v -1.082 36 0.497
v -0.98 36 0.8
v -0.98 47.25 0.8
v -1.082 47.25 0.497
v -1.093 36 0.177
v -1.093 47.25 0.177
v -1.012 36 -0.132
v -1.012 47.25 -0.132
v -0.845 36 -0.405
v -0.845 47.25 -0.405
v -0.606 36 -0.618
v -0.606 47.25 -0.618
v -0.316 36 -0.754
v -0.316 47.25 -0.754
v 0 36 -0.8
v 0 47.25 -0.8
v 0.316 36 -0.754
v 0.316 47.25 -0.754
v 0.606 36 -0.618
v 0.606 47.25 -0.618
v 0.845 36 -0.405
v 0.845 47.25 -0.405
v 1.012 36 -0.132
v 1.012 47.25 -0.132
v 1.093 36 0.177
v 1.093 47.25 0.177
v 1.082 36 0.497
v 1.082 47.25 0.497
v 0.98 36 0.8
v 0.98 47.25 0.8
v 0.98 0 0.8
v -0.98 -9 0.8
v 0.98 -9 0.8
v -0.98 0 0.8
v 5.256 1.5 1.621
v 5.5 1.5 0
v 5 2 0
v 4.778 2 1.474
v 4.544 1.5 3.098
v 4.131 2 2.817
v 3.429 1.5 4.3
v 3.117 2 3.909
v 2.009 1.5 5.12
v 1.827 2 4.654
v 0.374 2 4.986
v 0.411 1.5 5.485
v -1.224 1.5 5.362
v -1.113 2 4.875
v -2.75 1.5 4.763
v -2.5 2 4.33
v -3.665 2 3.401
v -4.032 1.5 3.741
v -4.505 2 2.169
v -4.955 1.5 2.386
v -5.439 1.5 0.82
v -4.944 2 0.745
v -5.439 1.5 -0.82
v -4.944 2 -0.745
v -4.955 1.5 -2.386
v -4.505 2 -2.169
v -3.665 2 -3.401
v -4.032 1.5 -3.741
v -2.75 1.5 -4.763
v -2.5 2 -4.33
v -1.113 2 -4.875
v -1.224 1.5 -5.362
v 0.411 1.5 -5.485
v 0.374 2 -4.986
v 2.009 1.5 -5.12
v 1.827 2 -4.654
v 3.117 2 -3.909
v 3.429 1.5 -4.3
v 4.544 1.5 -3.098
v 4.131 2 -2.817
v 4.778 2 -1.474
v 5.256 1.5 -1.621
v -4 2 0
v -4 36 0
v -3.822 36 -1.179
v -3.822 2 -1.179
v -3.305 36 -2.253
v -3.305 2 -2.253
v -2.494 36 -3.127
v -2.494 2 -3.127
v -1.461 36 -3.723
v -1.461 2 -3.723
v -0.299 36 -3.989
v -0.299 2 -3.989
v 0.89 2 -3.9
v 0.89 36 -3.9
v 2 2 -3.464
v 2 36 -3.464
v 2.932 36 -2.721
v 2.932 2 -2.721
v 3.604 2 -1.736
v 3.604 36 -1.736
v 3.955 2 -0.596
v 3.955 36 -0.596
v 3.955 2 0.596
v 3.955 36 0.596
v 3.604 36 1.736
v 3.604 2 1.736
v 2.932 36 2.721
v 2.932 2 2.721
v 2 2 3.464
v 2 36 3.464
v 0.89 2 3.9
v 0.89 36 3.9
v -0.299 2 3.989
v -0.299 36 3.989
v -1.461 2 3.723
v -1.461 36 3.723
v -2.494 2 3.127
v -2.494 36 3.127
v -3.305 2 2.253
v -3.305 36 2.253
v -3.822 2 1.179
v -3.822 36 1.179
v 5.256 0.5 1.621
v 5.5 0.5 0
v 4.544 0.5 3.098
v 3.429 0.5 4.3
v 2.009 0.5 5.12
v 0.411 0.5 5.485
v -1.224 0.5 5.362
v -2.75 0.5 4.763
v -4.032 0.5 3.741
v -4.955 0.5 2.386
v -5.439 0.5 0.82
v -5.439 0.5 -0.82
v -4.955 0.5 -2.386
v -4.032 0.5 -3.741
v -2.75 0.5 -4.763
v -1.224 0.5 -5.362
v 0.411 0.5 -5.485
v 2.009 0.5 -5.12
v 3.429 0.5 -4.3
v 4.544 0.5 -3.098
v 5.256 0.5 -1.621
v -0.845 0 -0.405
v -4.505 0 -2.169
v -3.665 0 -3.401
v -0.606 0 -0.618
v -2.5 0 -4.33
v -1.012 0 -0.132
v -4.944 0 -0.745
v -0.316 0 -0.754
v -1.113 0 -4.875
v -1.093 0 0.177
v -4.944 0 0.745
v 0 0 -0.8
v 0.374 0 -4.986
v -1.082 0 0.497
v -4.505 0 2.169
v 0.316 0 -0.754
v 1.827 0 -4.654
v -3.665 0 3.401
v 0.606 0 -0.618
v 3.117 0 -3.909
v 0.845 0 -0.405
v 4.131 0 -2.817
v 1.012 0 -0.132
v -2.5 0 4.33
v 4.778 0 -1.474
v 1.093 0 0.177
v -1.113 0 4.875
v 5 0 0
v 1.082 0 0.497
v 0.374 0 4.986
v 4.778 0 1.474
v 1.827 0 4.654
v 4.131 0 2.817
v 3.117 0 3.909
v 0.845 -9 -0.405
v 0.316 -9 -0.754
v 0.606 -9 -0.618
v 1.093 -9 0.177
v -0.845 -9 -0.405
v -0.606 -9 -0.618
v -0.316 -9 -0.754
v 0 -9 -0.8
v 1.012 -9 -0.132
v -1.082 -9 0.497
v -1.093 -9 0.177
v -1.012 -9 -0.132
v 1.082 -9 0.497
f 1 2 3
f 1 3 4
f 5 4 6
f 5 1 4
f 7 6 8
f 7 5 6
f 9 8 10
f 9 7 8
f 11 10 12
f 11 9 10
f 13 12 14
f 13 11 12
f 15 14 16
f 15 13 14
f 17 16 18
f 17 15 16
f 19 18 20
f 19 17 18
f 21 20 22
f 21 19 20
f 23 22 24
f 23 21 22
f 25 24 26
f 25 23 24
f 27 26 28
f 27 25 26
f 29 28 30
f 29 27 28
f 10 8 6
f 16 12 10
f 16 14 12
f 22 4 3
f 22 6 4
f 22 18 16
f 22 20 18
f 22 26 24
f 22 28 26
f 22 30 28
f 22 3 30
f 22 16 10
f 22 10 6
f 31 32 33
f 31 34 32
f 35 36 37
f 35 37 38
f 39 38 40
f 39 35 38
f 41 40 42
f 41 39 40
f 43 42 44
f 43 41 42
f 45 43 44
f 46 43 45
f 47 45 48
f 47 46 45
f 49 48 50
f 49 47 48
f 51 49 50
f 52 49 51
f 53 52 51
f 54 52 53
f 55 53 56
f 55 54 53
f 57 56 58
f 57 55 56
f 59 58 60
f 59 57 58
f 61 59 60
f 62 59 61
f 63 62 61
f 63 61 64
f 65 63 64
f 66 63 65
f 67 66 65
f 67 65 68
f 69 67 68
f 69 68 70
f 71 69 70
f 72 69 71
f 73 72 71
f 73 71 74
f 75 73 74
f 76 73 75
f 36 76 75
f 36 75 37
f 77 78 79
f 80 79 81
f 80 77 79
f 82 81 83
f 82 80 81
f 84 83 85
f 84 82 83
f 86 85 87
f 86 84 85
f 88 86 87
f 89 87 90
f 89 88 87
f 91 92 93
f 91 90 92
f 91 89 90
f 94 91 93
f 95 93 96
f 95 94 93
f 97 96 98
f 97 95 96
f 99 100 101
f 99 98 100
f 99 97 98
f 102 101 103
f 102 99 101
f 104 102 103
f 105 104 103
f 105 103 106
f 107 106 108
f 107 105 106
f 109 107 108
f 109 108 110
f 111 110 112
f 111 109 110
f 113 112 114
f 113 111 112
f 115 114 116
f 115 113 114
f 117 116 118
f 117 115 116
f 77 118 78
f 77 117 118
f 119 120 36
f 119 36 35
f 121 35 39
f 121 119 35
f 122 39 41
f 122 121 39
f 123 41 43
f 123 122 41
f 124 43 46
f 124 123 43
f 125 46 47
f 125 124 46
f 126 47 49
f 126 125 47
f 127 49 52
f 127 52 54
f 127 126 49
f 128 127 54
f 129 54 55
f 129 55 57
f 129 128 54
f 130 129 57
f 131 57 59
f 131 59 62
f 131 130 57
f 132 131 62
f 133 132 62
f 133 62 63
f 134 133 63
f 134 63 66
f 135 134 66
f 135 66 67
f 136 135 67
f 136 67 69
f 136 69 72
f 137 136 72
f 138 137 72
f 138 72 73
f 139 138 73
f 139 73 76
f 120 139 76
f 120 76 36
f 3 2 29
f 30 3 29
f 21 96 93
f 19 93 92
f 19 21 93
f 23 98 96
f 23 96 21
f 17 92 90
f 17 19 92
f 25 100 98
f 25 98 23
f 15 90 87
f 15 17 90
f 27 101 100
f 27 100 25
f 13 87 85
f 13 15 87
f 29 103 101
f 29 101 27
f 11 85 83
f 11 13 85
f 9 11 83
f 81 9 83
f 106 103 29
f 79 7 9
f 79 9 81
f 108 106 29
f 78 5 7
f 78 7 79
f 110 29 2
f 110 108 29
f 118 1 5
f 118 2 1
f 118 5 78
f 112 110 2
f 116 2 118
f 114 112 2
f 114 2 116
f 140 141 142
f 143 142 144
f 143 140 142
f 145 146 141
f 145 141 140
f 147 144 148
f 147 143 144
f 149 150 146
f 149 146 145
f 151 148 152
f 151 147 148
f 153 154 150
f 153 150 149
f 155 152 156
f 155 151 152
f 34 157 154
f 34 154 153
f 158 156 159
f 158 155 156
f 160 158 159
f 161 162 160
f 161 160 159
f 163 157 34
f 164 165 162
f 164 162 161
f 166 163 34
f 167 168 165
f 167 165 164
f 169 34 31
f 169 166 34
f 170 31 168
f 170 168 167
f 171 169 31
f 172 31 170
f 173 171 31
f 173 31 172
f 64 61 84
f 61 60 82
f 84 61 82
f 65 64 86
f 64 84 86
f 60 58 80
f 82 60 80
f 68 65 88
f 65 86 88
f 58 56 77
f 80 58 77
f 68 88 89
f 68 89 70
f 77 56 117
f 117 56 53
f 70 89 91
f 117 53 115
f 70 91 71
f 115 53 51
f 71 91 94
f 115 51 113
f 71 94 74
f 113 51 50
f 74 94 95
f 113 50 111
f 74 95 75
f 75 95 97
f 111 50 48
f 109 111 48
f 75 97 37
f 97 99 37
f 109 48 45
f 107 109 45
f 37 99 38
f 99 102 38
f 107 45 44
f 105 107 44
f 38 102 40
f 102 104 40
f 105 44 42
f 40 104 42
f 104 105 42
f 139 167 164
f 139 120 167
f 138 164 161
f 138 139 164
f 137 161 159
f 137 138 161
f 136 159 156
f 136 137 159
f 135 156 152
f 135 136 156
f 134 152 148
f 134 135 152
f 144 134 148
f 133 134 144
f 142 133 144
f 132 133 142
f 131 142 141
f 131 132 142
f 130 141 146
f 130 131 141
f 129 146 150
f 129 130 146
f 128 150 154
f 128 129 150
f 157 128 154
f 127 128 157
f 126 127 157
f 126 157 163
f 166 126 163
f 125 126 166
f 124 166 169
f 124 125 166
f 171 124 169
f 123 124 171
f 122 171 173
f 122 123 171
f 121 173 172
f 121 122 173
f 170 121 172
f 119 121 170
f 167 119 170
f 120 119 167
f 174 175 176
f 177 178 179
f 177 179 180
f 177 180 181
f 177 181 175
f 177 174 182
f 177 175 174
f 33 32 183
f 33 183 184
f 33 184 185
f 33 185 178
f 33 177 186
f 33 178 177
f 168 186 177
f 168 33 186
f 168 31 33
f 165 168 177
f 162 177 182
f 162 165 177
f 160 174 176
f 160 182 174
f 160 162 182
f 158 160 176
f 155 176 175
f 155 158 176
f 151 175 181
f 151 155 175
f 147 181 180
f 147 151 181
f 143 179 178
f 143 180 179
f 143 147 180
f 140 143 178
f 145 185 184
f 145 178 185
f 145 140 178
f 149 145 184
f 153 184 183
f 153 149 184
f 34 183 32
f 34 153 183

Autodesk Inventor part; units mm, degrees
ref_plane "YZ Plane" through (0, 0, 0) normal (1, 0, 0) x (0, 1, 0)
ref_plane "XZ Plane" through (0, 0, 0) normal (0, 1, 0) x (-1, 0, 0)
ref_plane "XY Plane" through (0, 0, 0) normal (0, 0, 1) x (1, 0, 0)
sketch "Sketch1" plane through (0, 0, 0) normal (0, 1, 0) x (-1, 0, 0)
  circle A0 centre (0, 0) radius 4
  dimension "d0" = 8
extrude "Extrusion1" add sketch "Sketch1" along normal blind 36
sketch "Sketch2" plane through (0, 36, 0) normal (0, 1, 0) x (1, 0, 0)
  line L0 (0, -2) -> (2.3553, -2)
  line L1 (-0.9798, -0.8) -> (0.9798, -0.8)
  arc A0 (0.9798, -0.8) -> (-0.9798, -0.8) centre (0, -0.3) ccw
  circle A1 centre (0, 0) radius 4 projected
  line L2 (5.6, 0) -> (-5.6, 0) projected
  dimension "d4" = 1.2
  dimension "d6" = 1.1
  dimension "d7" = 0.3
extrude "Extrusion2" add sketch "Sketch2" along normal blind 11.25 contours A0 L2 L1 | A0 L2
sketch "Sketch3" plane through (0, 0, 0) normal (0, -1, 0) x (1, 0, 0)
  line L0 (-0.9798, 0.8) -> (0.9798, 0.8)
  arc A0 (-0.9798, 0.8) -> (0.9798, 0.8) centre (0, 0.3) ccw
  point P0 (0, 0)
  point P1 (0, 0)
  point P2 (0, 0.8)
  dimension "d12" = 1.9596
  dimension "d16" = 1.1
  dimension "d17" = 0.3
extrude "Extrusion3" add sketch "Sketch3" along normal blind 9
sketch "Sketch5" plane through (0, 0, 0) normal (0, -1, 0) x (1, 0, 0)
  circle A0 centre (0, 0) radius 5.5
  dimension "d29" = 11
extrude "Extrusion5" add sketch "Sketch5" against normal blind 2
chamfer "Chamfer3" distance 0.5 angle 45 2 edges at (-5.5, 0, 0) (-5.5, 2, 0)
equation "\"d4\" = d3"
equation "\"d3\" = 1.2"
properties part number "axle-skibidi"
